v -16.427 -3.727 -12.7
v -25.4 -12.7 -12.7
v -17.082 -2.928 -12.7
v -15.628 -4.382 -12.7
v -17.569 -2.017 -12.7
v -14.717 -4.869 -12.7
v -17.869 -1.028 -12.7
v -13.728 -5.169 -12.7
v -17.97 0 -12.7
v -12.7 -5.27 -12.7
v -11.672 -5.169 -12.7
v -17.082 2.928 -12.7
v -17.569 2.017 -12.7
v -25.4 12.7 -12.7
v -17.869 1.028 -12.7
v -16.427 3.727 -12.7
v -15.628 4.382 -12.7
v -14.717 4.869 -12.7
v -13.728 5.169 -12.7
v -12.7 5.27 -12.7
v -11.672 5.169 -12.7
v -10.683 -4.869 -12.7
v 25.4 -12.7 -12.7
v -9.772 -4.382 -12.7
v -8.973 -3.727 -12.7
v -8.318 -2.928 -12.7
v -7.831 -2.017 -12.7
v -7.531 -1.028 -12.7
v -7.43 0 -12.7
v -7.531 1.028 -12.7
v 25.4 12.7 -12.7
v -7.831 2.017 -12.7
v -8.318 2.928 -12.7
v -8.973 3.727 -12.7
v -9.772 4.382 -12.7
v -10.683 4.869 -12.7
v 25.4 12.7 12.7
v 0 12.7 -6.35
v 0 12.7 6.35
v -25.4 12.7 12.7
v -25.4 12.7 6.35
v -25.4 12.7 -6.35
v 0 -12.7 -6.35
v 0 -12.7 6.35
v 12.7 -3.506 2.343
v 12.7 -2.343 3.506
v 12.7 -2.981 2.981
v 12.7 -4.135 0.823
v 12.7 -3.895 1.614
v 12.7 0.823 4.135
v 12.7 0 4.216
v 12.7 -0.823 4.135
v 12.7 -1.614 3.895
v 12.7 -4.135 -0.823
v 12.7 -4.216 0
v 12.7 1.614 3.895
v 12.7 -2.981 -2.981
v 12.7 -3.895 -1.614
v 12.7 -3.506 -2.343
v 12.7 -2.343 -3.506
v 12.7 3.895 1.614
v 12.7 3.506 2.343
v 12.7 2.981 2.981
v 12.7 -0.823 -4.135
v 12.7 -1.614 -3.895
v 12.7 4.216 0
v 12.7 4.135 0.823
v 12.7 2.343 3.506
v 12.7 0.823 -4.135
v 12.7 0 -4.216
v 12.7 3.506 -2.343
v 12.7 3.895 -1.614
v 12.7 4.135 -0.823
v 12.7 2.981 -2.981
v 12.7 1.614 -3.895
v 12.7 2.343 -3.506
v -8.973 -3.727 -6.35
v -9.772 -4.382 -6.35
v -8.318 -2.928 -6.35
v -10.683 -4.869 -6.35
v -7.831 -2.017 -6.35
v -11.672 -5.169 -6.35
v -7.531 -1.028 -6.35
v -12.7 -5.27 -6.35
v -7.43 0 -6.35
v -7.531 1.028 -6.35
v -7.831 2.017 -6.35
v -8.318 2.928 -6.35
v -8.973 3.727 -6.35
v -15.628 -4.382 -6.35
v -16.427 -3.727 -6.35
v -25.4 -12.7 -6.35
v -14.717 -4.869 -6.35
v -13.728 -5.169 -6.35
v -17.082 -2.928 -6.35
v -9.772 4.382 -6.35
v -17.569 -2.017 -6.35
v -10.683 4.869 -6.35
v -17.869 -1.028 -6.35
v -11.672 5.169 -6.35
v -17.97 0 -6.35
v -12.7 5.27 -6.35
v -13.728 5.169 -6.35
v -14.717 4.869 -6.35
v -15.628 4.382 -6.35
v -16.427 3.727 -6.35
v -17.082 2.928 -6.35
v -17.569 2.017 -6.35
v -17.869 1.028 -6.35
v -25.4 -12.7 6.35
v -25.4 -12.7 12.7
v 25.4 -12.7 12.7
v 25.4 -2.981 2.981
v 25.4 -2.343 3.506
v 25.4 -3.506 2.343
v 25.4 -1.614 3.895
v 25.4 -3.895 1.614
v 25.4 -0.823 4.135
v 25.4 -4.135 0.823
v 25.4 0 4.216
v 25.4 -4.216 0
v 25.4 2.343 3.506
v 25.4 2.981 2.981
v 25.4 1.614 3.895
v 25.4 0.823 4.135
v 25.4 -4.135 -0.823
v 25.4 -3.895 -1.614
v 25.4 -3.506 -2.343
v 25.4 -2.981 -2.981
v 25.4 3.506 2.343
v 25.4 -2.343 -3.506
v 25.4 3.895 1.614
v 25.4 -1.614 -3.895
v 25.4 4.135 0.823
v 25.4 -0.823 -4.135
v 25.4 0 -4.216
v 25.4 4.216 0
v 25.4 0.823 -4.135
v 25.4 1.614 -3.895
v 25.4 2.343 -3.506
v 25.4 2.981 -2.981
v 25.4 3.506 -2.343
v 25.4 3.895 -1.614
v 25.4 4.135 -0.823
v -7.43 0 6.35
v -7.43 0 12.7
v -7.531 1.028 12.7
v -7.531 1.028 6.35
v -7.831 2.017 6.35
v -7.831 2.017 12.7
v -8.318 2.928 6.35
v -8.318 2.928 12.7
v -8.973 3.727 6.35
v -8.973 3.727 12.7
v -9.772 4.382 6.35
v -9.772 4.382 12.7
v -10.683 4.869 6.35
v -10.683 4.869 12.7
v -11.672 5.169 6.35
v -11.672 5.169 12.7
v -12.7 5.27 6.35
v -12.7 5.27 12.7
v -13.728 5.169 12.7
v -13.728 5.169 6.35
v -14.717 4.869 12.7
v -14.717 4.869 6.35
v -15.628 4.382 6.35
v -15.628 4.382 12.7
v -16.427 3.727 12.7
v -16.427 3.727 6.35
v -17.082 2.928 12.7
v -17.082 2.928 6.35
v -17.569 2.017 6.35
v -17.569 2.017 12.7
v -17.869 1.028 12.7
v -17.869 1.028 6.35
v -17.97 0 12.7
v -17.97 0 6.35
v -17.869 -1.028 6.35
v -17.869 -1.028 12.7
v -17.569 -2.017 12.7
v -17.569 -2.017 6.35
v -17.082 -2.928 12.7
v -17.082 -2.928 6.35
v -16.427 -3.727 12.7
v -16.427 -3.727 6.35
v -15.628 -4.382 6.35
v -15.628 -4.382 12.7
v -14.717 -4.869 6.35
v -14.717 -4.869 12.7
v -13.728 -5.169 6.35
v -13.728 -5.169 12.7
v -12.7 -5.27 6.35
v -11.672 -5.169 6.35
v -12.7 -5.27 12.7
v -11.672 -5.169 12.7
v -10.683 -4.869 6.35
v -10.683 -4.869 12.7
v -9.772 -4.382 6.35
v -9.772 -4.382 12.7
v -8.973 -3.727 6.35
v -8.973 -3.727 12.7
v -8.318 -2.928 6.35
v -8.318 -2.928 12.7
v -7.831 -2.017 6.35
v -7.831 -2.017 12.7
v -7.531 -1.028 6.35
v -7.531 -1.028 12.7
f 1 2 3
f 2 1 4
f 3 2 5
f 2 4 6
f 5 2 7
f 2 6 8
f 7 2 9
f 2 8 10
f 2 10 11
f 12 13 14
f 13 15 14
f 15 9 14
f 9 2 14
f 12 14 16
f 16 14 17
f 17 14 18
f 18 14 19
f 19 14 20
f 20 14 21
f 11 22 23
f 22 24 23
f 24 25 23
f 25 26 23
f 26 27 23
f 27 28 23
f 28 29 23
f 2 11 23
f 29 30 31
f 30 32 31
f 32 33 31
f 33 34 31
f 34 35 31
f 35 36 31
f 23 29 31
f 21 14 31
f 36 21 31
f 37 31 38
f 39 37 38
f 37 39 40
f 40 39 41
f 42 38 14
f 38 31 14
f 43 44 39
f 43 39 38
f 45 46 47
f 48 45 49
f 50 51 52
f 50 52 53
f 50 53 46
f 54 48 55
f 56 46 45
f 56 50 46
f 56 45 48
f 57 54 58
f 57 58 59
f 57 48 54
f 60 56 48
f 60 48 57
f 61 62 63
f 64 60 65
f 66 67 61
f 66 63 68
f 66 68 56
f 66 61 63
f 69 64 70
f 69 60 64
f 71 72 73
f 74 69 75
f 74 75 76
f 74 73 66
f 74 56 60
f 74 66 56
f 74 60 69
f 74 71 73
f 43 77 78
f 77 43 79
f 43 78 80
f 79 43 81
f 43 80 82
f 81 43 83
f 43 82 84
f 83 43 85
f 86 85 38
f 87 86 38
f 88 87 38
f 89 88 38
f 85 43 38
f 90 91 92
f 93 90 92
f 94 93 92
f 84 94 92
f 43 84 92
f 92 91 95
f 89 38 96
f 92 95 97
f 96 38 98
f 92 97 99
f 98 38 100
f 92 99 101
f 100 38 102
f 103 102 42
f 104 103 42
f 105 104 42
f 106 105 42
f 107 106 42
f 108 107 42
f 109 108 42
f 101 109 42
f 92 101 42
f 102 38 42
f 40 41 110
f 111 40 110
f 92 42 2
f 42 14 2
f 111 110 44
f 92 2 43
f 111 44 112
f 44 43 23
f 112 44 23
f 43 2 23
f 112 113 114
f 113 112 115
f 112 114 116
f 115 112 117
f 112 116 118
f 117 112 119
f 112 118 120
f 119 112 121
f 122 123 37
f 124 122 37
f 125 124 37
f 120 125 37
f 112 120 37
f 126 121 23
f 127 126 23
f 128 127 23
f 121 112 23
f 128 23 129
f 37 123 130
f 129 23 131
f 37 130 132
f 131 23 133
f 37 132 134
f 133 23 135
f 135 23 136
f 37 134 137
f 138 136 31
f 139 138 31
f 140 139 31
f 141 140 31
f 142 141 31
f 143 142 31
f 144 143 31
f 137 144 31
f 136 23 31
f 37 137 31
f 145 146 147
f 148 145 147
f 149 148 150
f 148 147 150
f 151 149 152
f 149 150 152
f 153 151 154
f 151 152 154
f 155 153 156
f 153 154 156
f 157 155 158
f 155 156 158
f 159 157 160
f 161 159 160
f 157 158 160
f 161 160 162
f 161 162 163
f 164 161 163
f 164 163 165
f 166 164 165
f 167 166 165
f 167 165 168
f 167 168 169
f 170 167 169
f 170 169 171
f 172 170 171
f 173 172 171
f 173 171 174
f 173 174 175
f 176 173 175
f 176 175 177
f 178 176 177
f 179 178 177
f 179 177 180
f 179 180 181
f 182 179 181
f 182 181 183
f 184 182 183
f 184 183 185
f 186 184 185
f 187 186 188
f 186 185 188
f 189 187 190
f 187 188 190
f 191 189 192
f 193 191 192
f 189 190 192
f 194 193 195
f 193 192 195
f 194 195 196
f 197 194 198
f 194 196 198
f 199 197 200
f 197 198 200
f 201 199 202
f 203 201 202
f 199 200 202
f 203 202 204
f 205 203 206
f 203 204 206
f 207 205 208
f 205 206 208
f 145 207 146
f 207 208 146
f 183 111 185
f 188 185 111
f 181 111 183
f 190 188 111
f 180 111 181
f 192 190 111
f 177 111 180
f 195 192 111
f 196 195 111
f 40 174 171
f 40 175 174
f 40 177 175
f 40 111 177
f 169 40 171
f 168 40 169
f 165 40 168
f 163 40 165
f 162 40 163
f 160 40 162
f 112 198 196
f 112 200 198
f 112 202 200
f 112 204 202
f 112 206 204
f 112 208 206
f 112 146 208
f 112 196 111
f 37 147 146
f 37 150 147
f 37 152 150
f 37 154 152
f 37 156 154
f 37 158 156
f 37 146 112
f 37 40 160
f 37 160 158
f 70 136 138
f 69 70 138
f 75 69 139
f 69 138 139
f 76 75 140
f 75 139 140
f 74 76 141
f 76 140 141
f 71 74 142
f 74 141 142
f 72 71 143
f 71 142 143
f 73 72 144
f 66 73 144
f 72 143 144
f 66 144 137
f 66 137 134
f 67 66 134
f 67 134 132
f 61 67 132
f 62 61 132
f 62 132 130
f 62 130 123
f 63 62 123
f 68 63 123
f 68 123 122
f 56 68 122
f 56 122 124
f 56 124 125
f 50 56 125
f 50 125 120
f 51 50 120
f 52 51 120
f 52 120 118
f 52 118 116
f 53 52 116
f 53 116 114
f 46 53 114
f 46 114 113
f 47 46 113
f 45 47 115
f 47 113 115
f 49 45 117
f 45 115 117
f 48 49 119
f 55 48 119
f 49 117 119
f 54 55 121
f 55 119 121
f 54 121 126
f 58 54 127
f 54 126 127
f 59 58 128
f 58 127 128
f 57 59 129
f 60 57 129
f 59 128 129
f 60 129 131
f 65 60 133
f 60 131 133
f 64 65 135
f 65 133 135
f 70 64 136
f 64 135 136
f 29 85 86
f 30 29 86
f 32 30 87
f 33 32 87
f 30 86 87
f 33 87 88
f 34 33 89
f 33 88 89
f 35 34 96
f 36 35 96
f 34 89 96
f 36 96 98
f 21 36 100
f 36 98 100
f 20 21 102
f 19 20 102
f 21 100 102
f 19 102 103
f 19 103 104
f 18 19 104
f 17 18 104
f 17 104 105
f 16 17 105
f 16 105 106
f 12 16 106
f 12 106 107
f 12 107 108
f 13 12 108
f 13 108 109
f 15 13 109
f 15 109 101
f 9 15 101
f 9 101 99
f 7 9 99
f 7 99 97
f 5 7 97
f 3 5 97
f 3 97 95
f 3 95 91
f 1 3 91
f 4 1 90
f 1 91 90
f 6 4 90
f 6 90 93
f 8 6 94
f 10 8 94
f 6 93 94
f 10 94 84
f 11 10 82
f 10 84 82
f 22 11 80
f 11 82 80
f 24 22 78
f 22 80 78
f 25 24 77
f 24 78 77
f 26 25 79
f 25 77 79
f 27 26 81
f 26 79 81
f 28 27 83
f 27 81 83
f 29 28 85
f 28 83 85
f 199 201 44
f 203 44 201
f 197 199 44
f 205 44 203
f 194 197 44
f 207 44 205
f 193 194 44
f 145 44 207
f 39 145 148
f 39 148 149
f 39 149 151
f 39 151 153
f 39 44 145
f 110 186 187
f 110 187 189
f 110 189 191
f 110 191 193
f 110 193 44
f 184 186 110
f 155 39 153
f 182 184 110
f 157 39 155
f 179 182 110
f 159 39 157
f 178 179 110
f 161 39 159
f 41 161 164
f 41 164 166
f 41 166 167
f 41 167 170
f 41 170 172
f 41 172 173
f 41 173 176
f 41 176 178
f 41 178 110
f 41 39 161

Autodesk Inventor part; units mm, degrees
ref_plane "YZ Plane" through (0, 0, 0) normal (1, 0, 0) x (0, 1, 0)
ref_plane "XZ Plane" through (0, 0, 0) normal (0, 1, 0) x (-1, 0, 0)
ref_plane "XY Plane" through (0, 0, 0) normal (0, 0, 1) x (1, 0, 0)
sketch "Sketch2" plane through (0, 0, 0) normal (0, 0, 1) x (1, 0, 0)
  line L0 (-25.4, -12.7) -> (25.4, -12.7)
  line L1 (25.4, -12.7) -> (25.4, 12.7)
  line L2 (25.4, 12.7) -> (-25.4, 12.7)
  line L3 (-25.4, 12.7) -> (-25.4, -12.7)
  line L4 (-25.4, -12.7) -> (25.4, 12.7) construction
  line L5 (25.4, -12.7) -> (-25.4, 12.7) construction
  point P0 (0, 0)
  dimension "d4" = 50.8
  dimension "d5" = 25.4
extrude "Extrusion2" add sketch "Sketch2" along normal mid plane 25.4
sketch "Sketch3" plane through (-25.4, 12.7, 12.7) normal (0, 1, 0) x (1, 0, 0)
  line L0 (0, 25.4) -> (0, 0) construction
  line L1 (25.4, 12.7) -> (25.4, 19.05)
  line L2 (25.4, 19.05) -> (0, 19.05)
  line L3 (0, 19.05) -> (0, 12.7)
  line L4 (0, 0) -> (0, 25.4) construction
  line L5 (25.4, 12.7) -> (25.4, 6.35)
  line L6 (25.4, 6.35) -> (0, 6.35)
  line L7 (0, 6.35) -> (0, 12.7)
  dimension "d8" = 25.4
  dimension "d10" = 12.7
extrude "Extrusion3" cut sketch "Sketch3" against normal through all
sketch "Sketch4" plane through (0, 0, 12.7) normal (0, 0, 1) x (1, 0, 0)
  circle A0 centre (-12.7, 0) radius 5.2705
  line L0 (-25.4, 12.7) -> (-25.4, -12.7) projected
  point P0 (0, 0)
  dimension "d13" = 10.541
  dimension "d14" = 12.7
extrude "Extrusion4" cut sketch "Sketch4" against normal through all
sketch "Sketch5" plane through (25.4, -12.7, 12.7) normal (1, 0, 0) x (0, 0, -1)
  circle A0 centre (12.7, 12.7) radius 4.2164
  dimension "d27" = 8.4328
extrude "Extrusion5" cut sketch "Sketch5" against normal blind 12.7
properties part number "piston" material "PET Plastic"
